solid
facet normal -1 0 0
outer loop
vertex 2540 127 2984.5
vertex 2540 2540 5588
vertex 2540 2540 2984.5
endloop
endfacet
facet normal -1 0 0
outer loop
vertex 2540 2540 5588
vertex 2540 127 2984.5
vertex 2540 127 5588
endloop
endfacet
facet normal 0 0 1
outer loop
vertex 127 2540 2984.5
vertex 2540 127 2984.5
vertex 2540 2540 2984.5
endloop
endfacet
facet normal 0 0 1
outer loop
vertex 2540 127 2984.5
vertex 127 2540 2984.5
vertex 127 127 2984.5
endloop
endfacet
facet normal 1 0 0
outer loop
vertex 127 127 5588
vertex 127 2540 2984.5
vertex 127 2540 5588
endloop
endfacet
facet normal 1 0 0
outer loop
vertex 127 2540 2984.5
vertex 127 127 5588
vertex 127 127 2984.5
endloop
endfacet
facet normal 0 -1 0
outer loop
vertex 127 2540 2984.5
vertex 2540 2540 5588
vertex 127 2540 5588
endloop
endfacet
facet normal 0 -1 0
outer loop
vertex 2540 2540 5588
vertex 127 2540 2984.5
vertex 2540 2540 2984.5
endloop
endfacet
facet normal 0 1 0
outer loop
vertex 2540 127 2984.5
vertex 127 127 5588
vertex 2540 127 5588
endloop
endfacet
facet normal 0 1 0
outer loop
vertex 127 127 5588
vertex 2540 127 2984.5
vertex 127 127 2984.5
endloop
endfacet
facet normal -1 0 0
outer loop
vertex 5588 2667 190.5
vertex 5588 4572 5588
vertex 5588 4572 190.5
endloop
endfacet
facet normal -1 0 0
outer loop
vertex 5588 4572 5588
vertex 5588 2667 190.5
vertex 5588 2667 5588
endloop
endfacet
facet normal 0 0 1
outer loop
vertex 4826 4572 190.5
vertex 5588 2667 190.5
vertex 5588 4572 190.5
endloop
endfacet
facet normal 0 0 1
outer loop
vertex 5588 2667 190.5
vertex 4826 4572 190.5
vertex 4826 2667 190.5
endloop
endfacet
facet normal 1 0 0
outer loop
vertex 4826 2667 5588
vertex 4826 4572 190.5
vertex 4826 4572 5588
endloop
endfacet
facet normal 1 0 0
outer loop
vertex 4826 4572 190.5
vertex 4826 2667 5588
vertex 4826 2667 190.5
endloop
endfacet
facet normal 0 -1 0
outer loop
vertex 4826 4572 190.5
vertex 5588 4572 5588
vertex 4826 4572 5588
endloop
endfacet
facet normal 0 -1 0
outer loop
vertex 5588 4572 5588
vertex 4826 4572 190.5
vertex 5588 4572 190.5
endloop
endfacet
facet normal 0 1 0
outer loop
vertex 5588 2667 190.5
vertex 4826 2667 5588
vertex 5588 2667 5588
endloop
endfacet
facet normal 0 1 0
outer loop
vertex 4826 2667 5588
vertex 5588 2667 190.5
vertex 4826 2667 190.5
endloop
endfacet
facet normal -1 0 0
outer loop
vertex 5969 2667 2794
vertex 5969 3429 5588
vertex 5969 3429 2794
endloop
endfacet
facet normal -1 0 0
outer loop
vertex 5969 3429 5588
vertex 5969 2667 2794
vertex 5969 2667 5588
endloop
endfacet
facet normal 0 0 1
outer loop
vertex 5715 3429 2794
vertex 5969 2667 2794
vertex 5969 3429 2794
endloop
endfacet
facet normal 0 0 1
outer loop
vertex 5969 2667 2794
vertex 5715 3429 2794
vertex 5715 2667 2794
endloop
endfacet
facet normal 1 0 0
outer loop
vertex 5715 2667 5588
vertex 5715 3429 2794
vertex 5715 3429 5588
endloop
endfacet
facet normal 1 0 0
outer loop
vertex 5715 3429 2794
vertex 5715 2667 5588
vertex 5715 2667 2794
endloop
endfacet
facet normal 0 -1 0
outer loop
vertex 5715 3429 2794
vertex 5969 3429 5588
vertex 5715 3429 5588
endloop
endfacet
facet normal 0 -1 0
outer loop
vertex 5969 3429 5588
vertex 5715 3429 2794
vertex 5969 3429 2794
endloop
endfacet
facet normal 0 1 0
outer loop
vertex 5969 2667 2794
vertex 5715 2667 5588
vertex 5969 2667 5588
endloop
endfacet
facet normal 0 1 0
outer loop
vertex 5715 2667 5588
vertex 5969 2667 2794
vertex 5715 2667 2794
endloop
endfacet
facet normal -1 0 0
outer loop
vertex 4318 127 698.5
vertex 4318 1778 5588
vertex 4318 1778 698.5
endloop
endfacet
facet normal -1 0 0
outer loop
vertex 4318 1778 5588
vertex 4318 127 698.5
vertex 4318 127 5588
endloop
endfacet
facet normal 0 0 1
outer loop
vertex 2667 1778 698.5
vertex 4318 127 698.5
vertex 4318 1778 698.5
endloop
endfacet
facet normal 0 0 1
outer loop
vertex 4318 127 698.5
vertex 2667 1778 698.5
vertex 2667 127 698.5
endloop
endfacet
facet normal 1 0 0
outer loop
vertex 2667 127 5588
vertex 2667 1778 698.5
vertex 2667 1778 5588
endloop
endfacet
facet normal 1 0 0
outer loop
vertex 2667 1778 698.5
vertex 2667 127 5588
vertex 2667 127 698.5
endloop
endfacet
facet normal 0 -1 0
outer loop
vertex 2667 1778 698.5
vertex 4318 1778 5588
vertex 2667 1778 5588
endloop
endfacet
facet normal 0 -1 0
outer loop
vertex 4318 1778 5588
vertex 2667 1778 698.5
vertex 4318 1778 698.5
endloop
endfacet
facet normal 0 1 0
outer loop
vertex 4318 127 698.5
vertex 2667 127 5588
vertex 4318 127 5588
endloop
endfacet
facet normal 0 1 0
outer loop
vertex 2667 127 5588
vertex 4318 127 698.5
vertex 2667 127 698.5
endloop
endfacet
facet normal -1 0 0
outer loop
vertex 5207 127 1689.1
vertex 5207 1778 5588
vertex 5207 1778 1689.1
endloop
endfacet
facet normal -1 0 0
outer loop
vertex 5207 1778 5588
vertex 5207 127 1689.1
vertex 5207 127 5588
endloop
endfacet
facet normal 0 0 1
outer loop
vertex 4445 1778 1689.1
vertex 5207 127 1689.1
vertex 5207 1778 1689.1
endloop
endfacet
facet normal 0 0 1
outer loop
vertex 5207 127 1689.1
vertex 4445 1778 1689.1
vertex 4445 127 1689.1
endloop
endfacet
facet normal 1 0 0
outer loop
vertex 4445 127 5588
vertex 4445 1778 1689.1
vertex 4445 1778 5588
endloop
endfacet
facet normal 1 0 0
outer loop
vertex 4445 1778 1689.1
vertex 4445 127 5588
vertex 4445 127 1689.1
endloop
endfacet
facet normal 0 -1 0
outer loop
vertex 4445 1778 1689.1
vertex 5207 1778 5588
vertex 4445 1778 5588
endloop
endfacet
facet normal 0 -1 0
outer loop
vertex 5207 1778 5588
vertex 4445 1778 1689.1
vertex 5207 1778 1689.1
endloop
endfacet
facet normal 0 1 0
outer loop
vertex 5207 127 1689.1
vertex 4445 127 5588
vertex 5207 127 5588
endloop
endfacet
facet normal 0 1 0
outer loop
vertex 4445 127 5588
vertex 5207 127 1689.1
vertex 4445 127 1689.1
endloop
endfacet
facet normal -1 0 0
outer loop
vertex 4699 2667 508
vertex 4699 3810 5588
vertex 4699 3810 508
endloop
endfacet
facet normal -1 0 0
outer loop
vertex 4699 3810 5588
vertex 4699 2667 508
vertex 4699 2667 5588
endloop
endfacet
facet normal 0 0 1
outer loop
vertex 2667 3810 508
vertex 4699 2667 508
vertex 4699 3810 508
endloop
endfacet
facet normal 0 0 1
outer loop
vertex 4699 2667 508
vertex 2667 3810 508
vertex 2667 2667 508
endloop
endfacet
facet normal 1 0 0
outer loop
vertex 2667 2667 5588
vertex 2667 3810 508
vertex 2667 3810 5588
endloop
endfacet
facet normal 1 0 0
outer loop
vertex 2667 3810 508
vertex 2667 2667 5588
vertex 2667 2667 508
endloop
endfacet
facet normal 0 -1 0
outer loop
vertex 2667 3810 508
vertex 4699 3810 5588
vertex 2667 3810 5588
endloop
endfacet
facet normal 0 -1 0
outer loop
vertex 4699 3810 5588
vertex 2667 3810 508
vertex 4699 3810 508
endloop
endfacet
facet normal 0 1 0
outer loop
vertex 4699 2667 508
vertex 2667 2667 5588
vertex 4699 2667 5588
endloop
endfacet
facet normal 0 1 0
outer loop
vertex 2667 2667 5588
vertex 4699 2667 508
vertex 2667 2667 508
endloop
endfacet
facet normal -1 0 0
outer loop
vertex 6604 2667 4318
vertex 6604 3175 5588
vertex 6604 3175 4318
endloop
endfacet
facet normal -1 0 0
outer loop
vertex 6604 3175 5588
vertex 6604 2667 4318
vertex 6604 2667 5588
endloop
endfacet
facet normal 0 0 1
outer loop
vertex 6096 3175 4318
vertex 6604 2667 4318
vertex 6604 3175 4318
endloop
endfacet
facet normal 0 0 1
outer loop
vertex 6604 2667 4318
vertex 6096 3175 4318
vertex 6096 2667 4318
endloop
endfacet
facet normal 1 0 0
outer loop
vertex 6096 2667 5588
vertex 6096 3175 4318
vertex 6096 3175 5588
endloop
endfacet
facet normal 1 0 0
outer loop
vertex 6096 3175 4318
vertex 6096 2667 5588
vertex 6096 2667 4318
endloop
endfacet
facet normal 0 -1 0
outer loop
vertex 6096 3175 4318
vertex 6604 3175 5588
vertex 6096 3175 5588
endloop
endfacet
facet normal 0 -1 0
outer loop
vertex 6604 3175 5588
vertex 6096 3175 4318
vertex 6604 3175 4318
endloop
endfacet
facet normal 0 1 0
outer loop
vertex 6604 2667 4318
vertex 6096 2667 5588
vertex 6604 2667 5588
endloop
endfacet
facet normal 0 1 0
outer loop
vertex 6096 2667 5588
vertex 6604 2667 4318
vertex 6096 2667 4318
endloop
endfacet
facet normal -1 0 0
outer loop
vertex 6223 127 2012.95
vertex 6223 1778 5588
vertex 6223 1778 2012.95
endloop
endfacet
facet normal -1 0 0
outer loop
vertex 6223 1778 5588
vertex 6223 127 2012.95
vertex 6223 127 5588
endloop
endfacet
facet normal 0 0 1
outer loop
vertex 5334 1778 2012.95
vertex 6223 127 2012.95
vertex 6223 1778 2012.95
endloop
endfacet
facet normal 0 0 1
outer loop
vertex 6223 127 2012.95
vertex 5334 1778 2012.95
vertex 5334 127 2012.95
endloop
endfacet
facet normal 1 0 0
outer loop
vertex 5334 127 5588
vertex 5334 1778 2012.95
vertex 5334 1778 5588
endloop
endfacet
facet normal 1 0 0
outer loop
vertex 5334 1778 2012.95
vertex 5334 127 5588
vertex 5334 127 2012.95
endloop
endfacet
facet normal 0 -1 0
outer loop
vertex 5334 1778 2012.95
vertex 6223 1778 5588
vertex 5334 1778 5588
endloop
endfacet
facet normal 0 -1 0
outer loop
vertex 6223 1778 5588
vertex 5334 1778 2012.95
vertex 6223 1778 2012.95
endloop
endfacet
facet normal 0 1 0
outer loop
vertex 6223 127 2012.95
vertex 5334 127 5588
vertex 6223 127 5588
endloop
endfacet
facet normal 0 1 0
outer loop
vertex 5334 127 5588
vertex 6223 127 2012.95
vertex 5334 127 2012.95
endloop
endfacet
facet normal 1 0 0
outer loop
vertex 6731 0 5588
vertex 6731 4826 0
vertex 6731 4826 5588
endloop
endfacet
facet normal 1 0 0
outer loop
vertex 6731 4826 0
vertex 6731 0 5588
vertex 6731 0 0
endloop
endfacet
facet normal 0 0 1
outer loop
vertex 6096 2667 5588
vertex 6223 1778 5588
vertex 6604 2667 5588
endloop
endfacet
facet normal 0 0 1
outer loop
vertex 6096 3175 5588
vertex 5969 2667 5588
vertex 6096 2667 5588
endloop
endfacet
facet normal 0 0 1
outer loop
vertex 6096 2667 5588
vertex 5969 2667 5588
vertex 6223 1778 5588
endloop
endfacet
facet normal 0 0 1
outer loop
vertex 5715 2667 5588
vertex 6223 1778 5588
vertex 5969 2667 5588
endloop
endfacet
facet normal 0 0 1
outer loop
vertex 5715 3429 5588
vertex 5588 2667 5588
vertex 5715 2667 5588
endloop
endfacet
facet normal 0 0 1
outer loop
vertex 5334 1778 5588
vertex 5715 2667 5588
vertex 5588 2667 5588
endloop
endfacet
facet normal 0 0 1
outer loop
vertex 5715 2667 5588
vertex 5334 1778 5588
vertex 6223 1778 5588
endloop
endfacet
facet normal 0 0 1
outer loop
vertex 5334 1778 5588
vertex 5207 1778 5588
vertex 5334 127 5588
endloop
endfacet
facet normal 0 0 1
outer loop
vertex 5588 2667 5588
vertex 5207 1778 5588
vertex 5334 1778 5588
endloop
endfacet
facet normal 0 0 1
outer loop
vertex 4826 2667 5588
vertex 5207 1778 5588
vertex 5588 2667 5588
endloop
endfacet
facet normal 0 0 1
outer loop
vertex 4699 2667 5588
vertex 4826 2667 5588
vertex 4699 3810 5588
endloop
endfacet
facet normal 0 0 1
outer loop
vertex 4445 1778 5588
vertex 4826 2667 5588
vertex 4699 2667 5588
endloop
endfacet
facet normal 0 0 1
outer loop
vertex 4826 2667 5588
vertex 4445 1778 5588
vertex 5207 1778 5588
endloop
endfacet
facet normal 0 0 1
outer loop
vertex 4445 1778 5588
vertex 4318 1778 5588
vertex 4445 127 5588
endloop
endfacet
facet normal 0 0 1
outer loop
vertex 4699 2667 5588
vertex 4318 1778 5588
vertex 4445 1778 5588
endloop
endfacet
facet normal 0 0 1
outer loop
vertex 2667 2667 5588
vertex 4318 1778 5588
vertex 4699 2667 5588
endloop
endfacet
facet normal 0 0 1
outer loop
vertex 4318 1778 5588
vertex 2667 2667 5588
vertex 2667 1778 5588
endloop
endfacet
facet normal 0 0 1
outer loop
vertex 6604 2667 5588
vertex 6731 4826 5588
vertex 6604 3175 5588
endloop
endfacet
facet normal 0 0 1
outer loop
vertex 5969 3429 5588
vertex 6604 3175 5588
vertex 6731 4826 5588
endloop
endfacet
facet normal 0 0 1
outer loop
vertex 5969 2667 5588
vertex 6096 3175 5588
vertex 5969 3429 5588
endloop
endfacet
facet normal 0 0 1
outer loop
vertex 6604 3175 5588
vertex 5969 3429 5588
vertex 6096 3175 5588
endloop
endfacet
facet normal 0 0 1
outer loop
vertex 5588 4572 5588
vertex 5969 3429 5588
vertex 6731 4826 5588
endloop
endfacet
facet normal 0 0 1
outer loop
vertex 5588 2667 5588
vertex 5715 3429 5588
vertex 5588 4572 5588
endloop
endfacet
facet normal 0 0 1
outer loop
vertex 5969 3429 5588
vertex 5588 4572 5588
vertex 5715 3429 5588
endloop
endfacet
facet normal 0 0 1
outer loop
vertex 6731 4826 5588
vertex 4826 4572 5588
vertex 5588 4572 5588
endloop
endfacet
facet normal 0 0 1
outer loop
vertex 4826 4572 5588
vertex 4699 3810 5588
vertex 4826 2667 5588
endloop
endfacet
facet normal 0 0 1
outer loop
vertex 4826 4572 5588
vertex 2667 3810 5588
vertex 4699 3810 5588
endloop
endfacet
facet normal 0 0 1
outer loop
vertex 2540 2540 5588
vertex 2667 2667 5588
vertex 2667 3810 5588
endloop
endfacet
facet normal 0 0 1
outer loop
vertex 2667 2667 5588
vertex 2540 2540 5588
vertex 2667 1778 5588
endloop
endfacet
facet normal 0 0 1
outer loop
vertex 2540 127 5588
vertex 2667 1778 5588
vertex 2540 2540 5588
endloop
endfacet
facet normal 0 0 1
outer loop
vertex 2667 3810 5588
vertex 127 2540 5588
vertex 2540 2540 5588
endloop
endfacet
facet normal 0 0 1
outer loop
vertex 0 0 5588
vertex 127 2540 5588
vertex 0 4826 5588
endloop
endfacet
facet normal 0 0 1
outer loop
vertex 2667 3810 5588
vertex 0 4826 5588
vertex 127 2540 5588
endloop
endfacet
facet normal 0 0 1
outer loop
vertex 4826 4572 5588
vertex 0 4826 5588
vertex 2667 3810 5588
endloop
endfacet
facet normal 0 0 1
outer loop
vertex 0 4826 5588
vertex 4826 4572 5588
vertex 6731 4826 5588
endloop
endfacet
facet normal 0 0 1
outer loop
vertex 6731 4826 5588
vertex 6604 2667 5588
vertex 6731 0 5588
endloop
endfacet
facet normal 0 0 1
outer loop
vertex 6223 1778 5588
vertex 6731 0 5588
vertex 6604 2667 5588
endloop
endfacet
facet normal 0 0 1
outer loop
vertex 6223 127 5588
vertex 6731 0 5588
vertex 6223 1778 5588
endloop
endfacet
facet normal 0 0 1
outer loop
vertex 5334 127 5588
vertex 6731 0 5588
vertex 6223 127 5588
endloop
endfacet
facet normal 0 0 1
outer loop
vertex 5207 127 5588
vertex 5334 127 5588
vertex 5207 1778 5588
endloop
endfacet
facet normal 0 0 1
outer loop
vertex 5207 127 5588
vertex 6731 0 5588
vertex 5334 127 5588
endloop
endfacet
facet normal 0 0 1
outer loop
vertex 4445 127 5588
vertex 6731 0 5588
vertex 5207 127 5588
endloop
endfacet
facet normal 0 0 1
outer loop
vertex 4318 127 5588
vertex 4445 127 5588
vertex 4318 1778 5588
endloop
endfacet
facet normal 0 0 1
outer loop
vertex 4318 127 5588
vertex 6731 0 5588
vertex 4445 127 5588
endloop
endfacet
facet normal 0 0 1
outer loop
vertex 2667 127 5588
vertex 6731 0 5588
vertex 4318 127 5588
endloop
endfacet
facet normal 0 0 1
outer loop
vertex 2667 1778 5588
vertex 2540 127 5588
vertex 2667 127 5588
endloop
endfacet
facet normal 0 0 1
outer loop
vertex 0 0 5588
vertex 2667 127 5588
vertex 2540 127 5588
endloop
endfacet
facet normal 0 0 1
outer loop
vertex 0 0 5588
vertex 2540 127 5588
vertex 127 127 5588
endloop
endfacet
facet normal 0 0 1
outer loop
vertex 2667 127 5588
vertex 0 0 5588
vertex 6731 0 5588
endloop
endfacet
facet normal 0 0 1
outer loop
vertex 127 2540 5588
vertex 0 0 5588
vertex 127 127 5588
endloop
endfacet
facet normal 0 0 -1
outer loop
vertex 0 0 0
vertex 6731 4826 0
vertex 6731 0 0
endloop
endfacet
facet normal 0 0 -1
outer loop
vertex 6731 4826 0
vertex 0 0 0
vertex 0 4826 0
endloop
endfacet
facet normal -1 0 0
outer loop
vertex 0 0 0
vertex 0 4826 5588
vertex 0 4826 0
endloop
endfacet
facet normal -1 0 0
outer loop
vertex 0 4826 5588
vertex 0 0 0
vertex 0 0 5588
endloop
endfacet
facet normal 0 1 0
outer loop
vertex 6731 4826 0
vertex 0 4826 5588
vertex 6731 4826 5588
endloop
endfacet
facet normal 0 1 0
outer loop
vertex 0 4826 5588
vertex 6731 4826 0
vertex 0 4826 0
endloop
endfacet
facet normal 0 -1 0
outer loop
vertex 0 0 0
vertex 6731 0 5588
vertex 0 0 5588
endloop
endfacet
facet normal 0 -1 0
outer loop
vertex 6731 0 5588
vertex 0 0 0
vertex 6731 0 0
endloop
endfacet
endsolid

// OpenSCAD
// Tray 1 — Skincare / Hair / Body
// Units: 1/5 inch (0.2"). scale(5) → inches, scale(25.4) → mm.
// Footprint: 53u × 38u = 10.6" × 7.6", height: 44u (8.8")
//
// All items raised so tops sit flush at the rim.
// Comb and chapstick use stickout=3 (too thin to pinch at rim level).
// Cantu tub top sits 3u below rim (reach-in access).
//
// Layout:
//   y=1..19  cantu(19×19) │ okeefe(13×13) │ cerave(6×13) │ deo(7×13)
//   y=21..35              │ cleanser(16×9) │ brush(6×15) │ comb(2×6) │ chapstick(4×4)

floor_t  = 1;
cavity_h = 43;
tray_h   = cavity_h + floor_t;
stickout = 3;
wall     = 1;
chamfer  = 1.5;

raise_cantu     = (cavity_h - 3) - 17.5;  // top 3u below rim
raise_okeefe    = cavity_h - 38.5;
raise_cerave    = cavity_h - 30.7;
raise_deo       = cavity_h - 28.15;
raise_cleanser  = cavity_h - 40.0;
raise_brush     = cavity_h - 42.5;
raise_comb      = max(0, cavity_h + stickout - 25);
raise_chapstick = max(0, cavity_h + stickout - 13);

module slot(x, y, w, d, raise) {
    translate([x, y, floor_t + raise])
        cube([w, d, tray_h - floor_t - raise + 1]);
    if (chamfer > 0) {
        translate([x, y, tray_h - chamfer])
            rotate([-45, 0, 0])
                cube([w, chamfer * sqrt(2), chamfer * sqrt(2)]);
    }
}

W = 53; D = 38;

scale(25.4) scale(5) {
    difference() {
        cube([W, D, tray_h]);
        // Hair
        slot( 1,  1, 19, 19, raise_cantu);
        slot(38, 21,  6, 15, raise_brush);
        slot(45, 21,  2,  6, raise_comb);
        // Skin
        slot(21,  1, 13, 13, raise_okeefe);
        slot(35,  1,  6, 13, raise_cerave);
        slot(21, 21, 16,  9, raise_cleanser);
        slot(48, 21,  4,  4, raise_chapstick);
        // Body
        slot(42,  1,  7, 13, raise_deo);
    }
}
